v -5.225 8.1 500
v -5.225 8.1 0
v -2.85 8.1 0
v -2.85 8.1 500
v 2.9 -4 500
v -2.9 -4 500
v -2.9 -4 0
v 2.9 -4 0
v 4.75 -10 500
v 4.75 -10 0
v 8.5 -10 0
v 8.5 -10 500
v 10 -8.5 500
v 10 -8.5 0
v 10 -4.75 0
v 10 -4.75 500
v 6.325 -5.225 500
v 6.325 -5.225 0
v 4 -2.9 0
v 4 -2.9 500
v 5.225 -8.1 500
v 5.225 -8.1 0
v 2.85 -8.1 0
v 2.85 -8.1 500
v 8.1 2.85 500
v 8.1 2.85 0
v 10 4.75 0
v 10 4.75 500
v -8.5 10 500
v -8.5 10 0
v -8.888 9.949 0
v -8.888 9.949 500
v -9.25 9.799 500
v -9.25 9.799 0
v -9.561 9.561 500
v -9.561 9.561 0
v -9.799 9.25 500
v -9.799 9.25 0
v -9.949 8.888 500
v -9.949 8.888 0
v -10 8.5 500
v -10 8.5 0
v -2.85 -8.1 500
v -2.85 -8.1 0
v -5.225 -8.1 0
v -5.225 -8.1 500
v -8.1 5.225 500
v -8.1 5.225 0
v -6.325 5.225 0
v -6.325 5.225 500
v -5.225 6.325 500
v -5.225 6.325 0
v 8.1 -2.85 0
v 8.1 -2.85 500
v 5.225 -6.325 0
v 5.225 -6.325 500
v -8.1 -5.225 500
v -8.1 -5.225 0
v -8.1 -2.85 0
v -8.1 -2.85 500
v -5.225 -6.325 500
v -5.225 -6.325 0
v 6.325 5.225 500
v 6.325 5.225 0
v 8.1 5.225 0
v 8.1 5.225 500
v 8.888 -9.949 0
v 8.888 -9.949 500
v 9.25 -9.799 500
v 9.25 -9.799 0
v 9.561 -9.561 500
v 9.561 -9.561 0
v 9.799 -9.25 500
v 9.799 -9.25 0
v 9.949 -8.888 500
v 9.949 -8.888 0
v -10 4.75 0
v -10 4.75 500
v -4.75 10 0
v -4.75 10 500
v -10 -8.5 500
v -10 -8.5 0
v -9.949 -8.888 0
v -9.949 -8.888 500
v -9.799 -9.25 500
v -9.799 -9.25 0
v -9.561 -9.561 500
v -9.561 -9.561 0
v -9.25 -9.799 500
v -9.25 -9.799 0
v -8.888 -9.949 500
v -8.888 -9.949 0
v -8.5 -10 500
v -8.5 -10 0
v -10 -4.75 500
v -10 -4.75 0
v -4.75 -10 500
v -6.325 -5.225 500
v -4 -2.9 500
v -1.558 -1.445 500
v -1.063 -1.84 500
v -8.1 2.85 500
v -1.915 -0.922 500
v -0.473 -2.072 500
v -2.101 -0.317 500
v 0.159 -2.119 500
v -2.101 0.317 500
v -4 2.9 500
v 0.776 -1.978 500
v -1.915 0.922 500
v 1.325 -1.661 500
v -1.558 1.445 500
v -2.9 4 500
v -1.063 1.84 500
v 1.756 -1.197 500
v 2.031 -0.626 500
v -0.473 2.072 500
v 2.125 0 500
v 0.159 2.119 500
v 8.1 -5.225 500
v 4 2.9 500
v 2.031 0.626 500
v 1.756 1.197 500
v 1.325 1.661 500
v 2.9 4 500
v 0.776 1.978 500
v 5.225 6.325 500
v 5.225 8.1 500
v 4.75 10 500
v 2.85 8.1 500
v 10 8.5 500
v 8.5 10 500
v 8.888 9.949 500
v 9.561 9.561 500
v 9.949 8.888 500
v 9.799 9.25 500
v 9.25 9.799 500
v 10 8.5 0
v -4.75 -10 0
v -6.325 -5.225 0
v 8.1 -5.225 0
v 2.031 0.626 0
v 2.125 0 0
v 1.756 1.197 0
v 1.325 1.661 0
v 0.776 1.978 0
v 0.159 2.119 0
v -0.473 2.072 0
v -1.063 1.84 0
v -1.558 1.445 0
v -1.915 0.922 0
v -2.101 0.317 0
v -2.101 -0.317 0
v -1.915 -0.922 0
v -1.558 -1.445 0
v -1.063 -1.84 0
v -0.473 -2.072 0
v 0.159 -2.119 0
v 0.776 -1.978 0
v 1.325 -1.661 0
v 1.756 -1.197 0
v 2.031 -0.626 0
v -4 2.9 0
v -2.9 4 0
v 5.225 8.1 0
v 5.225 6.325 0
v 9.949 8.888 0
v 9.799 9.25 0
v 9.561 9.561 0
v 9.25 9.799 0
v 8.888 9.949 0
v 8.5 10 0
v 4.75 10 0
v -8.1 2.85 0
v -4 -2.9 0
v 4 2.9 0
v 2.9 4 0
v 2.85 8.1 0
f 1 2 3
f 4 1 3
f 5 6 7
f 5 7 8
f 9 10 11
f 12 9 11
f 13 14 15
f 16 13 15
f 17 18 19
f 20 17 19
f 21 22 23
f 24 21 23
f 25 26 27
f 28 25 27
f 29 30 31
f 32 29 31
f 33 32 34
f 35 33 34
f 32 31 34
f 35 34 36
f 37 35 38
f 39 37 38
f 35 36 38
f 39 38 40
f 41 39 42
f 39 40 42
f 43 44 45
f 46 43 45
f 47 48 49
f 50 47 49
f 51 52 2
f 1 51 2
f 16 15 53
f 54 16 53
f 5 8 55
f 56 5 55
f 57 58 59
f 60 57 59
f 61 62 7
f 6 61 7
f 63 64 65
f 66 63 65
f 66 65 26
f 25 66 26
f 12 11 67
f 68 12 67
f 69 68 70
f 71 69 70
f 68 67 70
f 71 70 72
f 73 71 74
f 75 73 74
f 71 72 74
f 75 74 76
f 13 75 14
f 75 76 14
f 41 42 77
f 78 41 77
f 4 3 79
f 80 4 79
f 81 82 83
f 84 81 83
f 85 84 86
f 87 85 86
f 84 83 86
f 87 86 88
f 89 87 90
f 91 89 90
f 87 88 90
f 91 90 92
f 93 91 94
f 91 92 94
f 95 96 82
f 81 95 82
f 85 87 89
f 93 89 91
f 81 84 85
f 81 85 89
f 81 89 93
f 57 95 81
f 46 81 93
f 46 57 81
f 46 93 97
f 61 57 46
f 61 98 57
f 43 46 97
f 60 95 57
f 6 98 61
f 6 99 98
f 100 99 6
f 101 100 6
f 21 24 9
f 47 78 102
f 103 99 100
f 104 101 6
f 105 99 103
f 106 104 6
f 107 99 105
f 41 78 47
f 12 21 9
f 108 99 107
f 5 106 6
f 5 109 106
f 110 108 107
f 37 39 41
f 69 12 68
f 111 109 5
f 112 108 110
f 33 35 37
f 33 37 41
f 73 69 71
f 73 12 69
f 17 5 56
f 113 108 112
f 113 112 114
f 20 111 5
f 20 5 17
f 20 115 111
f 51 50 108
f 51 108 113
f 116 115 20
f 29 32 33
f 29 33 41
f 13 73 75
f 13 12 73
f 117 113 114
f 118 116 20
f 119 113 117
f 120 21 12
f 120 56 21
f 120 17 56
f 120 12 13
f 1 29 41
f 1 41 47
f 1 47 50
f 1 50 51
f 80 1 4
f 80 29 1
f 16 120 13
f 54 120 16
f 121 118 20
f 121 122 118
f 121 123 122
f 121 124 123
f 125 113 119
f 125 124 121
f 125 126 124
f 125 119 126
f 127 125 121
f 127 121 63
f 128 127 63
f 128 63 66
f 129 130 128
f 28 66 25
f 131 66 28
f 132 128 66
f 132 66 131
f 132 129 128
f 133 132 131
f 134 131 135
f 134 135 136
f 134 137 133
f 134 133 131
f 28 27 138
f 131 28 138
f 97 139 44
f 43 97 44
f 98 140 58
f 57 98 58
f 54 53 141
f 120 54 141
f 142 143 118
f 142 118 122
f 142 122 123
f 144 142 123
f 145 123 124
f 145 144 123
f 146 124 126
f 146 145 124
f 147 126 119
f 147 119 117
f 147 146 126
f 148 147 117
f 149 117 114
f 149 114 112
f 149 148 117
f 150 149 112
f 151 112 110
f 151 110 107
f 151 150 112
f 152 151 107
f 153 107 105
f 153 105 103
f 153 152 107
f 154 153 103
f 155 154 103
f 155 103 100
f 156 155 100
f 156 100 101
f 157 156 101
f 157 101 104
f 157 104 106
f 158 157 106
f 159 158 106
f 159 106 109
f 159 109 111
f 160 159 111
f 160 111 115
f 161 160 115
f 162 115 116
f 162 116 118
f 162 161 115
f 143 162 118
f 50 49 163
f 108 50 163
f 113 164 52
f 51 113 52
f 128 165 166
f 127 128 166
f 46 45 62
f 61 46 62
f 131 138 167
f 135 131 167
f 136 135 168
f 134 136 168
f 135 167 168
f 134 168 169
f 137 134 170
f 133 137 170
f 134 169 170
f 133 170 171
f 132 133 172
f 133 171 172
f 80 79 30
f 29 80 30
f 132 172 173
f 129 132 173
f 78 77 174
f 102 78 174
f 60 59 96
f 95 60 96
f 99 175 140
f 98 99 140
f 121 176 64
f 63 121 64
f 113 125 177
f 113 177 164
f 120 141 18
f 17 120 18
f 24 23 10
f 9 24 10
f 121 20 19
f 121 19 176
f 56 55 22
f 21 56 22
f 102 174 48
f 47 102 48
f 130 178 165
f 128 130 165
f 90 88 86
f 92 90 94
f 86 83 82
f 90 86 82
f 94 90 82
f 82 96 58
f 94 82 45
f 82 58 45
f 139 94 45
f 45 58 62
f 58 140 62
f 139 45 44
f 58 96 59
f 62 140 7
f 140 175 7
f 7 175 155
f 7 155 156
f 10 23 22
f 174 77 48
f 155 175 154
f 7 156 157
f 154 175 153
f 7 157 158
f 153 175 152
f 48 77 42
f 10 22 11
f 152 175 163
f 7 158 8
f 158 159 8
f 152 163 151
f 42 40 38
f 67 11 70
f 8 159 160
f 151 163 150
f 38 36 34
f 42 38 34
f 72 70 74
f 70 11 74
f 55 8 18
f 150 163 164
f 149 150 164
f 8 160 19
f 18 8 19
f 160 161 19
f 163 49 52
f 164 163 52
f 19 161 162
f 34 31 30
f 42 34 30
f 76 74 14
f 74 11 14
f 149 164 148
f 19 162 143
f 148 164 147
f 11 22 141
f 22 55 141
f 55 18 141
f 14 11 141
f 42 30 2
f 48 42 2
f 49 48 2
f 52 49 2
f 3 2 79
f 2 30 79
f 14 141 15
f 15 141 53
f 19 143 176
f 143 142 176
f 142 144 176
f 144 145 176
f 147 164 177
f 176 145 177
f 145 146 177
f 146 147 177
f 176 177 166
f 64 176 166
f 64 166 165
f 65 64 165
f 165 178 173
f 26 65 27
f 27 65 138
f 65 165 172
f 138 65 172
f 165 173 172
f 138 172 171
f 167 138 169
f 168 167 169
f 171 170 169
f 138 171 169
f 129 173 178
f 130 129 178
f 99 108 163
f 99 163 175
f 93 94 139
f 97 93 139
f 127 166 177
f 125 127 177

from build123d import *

# Parameters (mm, degrees)
SKETCH1_R           = 2.125
BOSS_EXTRUDE1_DEPTH = 500


with BuildPart() as part:
    # Sketch1 → Boss-Extrude1 (new body)
    with BuildSketch(Plane.XY):
        with BuildLine():
            Line((8.1, 5.225), (8.1, 2.85))
            Line((8.1, 2.85), (10, 4.75))
            Line((10, 4.75), (10, 8.5))
            ThreePointArc((10, 8.5), (9.560660172, 9.560660172), (8.5, 10))
            Line((8.5, 10), (4.75, 10))
            Line((4.75, 10), (2.85, 8.1))
            Line((2.85, 8.1), (5.225, 8.1))
            Line((5.225, 8.1), (5.225, 6.325))
            Line((5.225, 6.325), (2.9, 4))
            Line((2.9, 4), (-2.9, 4))
            Line((-2.9, 4), (-5.225, 6.325))
            Line((-5.225, 6.325), (-5.225, 8.1))
            Line((-5.225, 8.1), (-2.85, 8.1))
            Line((-2.85, 8.1), (-4.75, 10))
            Line((-4.75, 10), (-8.5, 10))
            ThreePointArc((-8.5, 10), (-9.560660172, 9.560660172), (-10, 8.5))
            Line((-10, 8.5), (-10, 4.75))
            Line((-10, 4.75), (-8.1, 2.85))
            Line((-8.1, 2.85), (-8.1, 5.225))
            Line((-8.1, 5.225), (-6.325, 5.225))
            Line((-6.325, 5.225), (-4, 2.9))
            Line((-4, 2.9), (-4, -2.9))
            Line((-4, -2.9), (-6.325, -5.225))
            Line((-6.325, -5.225), (-8.1, -5.225))
            Line((-8.1, -5.225), (-8.1, -2.85))
            Line((-8.1, -2.85), (-10, -4.75))
            Line((-10, -4.75), (-10, -8.5))
            ThreePointArc((-10, -8.5), (-9.560660172, -9.560660172), (-8.5, -10))
            Line((-8.5, -10), (-4.75, -10))
            Line((-4.75, -10), (-2.85, -8.1))
            Line((-2.85, -8.1), (-5.225, -8.1))
            Line((-5.225, -8.1), (-5.225, -6.325))
            Line((-5.225, -6.325), (-2.9, -4))
            Line((-2.9, -4), (2.9, -4))
            Line((2.9, -4), (5.225, -6.325))
            Line((5.225, -6.325), (5.225, -8.1))
            Line((5.225, -8.1), (2.85, -8.1))
            Line((2.85, -8.1), (4.75, -10))
            Line((4.75, -10), (8.5, -10))
            ThreePointArc((8.5, -10), (9.560660172, -9.560660172), (10, -8.5))
            Line((10, -8.5), (10, -4.75))
            Line((10, -4.75), (8.1, -2.85))
            Line((8.1, -2.85), (8.1, -5.225))
            Line((8.1, -5.225), (6.325, -5.225))
            Line((6.325, -5.225), (4, -2.9))
            Line((4, -2.9), (4, 2.9))
            Line((4, 2.9), (6.325, 5.225))
            Line((6.325, 5.225), (8.1, 5.225))
        make_face()
        Circle(SKETCH1_R, mode=Mode.SUBTRACT)
    extrude(amount=BOSS_EXTRUDE1_DEPTH)


solid = part.part
